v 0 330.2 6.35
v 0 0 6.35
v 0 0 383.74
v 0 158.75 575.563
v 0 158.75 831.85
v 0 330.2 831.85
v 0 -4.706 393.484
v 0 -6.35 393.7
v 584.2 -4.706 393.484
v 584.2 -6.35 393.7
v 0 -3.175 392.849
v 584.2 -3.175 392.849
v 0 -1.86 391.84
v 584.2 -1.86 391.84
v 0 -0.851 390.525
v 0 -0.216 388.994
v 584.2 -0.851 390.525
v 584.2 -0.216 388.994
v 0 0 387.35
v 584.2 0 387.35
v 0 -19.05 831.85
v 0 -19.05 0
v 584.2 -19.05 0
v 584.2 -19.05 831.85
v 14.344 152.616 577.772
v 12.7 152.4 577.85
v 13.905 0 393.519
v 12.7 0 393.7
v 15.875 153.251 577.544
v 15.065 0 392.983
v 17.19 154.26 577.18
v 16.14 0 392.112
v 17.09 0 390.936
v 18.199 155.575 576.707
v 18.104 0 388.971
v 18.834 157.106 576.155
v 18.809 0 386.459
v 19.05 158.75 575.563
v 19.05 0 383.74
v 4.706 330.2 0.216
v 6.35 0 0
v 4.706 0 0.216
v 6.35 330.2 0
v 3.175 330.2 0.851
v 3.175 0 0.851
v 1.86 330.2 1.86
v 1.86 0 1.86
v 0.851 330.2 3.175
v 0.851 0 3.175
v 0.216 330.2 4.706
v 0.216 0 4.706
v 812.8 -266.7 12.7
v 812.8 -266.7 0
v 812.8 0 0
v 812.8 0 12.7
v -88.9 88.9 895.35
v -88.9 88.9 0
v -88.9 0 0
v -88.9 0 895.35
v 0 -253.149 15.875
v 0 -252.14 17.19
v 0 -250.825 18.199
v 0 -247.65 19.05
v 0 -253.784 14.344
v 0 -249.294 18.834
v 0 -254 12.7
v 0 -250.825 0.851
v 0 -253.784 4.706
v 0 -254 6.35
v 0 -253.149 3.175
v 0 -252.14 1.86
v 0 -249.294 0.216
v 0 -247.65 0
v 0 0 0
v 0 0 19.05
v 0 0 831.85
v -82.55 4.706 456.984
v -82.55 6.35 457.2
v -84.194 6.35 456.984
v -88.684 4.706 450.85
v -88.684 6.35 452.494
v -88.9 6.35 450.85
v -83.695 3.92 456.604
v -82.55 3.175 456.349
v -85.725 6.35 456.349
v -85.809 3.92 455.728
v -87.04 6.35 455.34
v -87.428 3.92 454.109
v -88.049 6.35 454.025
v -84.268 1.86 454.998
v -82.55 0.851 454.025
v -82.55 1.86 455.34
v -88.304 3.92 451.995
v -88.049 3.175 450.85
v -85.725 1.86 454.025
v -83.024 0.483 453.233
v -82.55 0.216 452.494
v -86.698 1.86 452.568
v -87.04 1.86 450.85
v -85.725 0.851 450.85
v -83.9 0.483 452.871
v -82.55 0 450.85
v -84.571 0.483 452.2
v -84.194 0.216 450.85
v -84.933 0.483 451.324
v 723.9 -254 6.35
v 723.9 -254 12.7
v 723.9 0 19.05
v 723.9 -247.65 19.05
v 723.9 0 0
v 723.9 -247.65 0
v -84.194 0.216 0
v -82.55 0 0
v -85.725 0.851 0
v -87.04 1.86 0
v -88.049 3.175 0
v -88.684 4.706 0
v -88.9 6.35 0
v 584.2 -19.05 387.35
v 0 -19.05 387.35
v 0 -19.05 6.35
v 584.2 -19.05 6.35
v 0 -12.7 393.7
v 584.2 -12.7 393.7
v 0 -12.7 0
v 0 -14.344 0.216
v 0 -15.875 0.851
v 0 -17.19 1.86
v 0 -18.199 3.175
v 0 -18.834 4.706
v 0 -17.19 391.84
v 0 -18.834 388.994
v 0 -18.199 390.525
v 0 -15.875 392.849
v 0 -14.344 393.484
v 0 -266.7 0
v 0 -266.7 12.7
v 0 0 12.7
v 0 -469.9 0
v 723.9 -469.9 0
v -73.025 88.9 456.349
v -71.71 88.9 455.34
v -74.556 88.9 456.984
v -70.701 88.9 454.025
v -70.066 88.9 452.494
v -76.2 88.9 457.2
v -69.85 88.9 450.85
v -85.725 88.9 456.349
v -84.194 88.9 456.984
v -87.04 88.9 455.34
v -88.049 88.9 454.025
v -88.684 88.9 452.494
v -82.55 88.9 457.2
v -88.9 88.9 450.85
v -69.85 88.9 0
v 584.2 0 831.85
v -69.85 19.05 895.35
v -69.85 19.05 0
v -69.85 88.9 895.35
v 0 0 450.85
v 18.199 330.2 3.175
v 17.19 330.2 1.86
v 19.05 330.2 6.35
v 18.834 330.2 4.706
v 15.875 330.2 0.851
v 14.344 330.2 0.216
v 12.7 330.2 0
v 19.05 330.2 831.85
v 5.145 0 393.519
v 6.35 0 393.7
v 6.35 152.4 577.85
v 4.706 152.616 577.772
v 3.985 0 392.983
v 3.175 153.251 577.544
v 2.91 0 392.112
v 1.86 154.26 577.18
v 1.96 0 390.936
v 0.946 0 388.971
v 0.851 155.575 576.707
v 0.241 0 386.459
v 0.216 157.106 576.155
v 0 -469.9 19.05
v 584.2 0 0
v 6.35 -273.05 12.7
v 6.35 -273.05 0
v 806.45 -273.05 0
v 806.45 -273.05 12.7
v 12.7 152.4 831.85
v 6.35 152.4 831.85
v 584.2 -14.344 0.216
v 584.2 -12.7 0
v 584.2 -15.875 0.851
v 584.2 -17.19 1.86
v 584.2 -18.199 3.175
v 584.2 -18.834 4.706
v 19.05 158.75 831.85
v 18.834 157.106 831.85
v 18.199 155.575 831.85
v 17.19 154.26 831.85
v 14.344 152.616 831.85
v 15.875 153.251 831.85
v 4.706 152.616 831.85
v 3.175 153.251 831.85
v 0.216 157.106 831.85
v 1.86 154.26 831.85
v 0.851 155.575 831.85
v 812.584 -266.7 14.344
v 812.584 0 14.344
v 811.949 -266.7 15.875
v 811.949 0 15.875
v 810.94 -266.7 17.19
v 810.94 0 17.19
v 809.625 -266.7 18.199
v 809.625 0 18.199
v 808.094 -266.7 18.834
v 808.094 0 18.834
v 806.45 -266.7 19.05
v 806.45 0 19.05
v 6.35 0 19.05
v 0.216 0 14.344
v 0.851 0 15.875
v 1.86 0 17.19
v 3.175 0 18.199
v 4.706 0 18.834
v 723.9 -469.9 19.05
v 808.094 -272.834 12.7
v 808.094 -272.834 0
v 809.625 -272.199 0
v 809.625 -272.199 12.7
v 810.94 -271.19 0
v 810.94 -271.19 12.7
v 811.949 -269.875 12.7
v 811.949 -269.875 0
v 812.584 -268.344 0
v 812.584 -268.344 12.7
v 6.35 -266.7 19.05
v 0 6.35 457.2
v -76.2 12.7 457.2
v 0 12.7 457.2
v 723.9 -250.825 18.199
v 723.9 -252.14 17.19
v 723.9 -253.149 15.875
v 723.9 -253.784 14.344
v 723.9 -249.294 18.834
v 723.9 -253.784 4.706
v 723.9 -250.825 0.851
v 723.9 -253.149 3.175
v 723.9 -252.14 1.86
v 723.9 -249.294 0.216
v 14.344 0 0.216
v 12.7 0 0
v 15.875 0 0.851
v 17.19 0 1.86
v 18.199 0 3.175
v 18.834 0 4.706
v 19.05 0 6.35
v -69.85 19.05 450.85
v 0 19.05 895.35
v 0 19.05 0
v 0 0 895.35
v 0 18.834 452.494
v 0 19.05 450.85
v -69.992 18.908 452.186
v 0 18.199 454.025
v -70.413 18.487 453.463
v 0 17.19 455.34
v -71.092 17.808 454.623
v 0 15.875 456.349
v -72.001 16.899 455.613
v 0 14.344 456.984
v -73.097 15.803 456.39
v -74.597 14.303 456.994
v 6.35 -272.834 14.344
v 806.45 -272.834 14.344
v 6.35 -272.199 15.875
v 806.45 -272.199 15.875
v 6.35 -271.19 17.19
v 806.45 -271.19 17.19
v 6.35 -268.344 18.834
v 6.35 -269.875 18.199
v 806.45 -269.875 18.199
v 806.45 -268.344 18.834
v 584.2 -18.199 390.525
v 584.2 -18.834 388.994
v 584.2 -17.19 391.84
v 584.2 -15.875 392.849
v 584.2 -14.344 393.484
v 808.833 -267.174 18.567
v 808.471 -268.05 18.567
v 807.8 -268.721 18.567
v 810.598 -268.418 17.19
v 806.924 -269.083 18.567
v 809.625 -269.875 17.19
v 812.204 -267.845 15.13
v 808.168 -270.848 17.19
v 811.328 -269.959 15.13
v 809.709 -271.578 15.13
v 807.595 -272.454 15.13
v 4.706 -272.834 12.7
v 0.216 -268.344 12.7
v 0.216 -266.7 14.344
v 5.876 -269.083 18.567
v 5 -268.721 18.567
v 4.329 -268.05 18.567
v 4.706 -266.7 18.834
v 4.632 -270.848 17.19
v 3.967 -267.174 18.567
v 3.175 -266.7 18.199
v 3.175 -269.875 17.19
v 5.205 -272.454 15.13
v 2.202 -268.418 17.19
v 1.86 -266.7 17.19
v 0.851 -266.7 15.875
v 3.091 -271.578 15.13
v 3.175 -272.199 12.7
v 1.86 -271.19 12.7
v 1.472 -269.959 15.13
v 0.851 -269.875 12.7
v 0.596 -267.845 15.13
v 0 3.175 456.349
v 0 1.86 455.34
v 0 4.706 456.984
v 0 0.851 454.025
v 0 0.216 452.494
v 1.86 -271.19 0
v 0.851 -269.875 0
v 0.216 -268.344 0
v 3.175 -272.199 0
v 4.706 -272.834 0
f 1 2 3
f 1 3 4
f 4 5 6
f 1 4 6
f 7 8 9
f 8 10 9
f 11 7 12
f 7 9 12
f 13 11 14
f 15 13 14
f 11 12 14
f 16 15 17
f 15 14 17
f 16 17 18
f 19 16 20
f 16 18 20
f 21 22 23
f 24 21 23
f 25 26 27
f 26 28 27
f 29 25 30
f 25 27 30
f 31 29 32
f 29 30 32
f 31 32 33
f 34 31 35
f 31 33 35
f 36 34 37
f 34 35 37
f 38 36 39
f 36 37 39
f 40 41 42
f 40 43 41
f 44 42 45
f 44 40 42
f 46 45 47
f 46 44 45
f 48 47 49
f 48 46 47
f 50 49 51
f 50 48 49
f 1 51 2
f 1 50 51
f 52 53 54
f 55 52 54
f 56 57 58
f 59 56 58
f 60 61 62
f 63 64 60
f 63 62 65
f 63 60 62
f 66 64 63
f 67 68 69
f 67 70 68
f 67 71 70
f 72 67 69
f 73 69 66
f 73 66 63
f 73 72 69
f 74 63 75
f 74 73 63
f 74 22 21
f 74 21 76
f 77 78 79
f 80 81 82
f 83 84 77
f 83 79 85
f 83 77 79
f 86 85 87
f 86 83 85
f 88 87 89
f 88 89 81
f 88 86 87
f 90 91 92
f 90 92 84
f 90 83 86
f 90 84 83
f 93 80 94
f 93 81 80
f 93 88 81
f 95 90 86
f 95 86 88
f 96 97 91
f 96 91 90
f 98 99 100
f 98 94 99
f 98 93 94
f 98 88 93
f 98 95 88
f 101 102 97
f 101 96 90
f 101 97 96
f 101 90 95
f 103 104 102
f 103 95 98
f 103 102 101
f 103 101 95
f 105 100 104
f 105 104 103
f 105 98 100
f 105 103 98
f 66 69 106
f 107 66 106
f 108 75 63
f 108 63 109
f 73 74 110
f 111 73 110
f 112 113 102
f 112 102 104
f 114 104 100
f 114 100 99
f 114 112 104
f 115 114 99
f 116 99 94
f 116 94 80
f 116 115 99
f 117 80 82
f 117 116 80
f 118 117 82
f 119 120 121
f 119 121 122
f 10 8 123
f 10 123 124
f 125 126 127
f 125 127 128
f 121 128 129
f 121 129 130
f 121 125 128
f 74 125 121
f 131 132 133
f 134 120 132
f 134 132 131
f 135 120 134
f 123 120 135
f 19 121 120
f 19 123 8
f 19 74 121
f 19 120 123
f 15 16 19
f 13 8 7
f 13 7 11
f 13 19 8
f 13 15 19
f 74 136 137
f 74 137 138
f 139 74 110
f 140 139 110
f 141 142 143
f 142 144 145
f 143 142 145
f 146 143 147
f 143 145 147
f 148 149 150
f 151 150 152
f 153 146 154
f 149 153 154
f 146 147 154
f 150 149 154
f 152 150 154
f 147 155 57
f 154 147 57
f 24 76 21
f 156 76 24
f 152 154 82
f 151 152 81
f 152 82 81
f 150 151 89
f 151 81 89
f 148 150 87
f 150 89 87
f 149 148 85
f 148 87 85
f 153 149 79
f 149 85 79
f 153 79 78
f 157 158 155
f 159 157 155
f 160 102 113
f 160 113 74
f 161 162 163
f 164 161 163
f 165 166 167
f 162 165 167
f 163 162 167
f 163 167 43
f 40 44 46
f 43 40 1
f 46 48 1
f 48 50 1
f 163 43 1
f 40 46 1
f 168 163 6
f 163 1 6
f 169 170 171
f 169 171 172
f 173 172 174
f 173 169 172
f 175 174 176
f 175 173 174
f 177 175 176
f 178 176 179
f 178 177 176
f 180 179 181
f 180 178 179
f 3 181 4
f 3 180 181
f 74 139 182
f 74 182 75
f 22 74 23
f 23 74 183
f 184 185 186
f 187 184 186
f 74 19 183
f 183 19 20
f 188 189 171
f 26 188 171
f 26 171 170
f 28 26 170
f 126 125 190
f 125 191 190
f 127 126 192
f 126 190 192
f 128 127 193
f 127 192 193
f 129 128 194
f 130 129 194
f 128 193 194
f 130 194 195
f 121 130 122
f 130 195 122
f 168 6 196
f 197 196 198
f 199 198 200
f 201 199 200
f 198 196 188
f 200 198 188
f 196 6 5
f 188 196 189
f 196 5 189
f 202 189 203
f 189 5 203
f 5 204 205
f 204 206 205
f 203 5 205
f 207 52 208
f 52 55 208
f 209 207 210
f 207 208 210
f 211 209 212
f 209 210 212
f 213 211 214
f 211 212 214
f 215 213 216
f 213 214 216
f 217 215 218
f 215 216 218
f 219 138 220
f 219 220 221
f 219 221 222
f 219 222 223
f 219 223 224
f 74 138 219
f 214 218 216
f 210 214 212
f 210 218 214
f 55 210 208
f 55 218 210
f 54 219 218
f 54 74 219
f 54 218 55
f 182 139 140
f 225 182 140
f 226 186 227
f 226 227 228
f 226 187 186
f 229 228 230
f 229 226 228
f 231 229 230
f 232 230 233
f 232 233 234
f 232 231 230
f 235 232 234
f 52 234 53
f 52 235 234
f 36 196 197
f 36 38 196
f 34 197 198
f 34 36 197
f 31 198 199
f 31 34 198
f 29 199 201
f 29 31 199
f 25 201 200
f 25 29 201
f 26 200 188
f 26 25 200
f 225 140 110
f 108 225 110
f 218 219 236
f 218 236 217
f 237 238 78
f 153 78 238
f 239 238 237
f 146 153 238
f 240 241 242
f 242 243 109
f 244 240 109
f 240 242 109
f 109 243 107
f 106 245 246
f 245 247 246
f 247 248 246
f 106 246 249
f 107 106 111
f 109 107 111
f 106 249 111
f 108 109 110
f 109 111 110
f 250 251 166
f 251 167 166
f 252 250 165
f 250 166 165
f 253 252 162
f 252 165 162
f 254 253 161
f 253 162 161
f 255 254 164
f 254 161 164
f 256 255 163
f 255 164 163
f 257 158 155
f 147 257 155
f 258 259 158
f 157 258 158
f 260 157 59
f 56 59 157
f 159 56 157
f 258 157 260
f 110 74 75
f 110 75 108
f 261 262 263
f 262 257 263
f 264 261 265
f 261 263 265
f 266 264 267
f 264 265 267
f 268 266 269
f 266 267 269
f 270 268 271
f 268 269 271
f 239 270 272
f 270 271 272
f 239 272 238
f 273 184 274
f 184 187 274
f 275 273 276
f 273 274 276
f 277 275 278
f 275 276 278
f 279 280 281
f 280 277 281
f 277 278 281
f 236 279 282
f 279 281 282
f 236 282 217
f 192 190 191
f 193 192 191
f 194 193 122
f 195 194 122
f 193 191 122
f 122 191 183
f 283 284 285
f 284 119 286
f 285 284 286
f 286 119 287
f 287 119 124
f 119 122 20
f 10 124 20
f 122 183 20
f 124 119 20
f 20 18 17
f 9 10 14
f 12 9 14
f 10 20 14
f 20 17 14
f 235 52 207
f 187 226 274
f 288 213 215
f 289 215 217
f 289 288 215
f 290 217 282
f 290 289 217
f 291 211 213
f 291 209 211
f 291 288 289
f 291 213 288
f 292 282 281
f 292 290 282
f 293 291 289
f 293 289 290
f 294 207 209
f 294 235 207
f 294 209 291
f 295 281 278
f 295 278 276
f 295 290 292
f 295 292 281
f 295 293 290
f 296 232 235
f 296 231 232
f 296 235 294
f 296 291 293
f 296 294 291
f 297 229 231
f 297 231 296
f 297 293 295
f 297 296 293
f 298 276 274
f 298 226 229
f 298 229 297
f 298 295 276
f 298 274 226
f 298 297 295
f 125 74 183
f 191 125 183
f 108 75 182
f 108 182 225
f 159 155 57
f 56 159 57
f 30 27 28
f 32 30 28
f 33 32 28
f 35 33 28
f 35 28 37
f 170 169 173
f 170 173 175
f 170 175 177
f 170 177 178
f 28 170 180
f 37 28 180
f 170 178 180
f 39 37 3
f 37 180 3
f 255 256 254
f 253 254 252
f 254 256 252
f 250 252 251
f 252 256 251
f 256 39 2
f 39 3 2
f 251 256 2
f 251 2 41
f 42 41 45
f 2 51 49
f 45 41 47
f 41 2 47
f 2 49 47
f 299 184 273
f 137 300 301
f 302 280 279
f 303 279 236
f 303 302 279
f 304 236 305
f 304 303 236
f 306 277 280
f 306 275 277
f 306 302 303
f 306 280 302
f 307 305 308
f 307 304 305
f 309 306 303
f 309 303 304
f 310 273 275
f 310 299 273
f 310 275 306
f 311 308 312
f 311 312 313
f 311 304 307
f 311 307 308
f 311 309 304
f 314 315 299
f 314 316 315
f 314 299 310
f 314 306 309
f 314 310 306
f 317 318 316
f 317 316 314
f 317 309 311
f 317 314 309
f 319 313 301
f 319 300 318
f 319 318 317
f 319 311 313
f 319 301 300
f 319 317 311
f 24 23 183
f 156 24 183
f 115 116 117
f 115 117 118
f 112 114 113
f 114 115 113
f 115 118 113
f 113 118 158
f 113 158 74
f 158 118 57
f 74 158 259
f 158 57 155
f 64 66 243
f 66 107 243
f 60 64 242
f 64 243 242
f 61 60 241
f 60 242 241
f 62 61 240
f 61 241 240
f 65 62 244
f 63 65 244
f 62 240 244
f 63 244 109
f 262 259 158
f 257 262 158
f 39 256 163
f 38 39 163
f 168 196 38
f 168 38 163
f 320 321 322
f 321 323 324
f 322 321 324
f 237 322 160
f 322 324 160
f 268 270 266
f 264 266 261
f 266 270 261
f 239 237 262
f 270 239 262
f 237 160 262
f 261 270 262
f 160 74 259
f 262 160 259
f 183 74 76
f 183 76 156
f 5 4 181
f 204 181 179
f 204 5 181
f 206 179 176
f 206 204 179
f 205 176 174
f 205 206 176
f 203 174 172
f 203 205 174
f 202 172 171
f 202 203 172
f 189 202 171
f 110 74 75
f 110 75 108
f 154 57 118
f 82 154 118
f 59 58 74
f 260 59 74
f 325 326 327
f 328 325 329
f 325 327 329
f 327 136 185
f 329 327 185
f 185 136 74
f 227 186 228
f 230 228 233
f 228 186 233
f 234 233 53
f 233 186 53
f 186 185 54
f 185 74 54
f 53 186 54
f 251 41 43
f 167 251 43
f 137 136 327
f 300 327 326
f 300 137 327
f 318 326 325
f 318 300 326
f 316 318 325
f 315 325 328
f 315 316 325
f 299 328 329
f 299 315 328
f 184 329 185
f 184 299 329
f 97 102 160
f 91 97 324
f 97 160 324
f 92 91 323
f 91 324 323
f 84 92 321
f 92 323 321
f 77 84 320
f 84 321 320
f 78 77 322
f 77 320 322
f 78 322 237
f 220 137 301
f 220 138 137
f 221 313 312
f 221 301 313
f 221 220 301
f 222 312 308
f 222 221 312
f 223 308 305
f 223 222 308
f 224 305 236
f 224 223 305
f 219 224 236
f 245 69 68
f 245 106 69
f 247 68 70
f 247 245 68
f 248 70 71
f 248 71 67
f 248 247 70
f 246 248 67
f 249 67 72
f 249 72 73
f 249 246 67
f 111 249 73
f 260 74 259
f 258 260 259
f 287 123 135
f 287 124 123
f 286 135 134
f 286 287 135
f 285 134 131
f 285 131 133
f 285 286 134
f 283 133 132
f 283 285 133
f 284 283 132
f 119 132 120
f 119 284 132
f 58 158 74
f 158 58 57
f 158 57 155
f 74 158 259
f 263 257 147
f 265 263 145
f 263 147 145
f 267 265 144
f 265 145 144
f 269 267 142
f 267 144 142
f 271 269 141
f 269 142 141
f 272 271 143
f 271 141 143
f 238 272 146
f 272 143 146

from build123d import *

# Parameters (mm, degrees)
F0_W         = 584.2
F0_H         = 19.05
F1_DEPTH     = 831.85
F2_W         = 723.9
F2_H         = 469.9
F3_DEPTH     = 19.05
F4_W         = 723.9
F4_H         = 254
F5_DEPTH     = 19.05
F6_W         = 812.8
F6_H         = 273.05
F7_DEPTH     = 19.05
F9_DEPTH     = 457.2
F11_DEPTH    = 895.35
F14_DEPTH    = 19.05
F15_DEPTH    = 19.05
F16_W        = 584.2
F16_H        = 393.7
F17_DEPTH    = 19.05
F18_R        = 6.35
F19_R        = 6.35
F20_R        = 6.35
F21_R        = 6.35
F22_R        = 6.35
F23_R        = 6.35
F24_R        = 6.35
F25_T1_DEPTH = 466.725
F25_S5_W     = 6.35
F25_S5_H     = 6.35
F25_T6_DEPTH = 6.35


# Not quite as in the source:
# - a fillet or chamfer that OpenCascade refuses, or shapes differently, is made with other operations: its cross-section is extruded or revolved along the edge and cut away or added


with BuildPart() as f1:
    # F0 (on Top) → F1 (new body)
    with BuildSketch(Plane.XY):
        with Locations((292.1, -9.525)):
            Rectangle(F0_W, F0_H)
    extrude(amount=F1_DEPTH)


with BuildPart() as f3:
    # F2 (on Top) → F3 (new body)
    with BuildSketch(Plane.XY):
        with Locations((361.95, -234.95)):
            Rectangle(F2_W, F2_H)
    extrude(amount=F3_DEPTH)


with BuildPart() as f5:
    # F4 (on Top) → F5 (new body)
    with BuildSketch(Plane.XY):
        with Locations((361.95, -127)):
            Rectangle(F4_W, F4_H)
    extrude(amount=F5_DEPTH)

    # F22
    f22_edges = [f5.edges().sort_by_distance(p)[0] for p in [
        (361.95, -254, 19.05),
        (361.95, -254, 0),
    ]]
    fillet(f22_edges, radius=F22_R)


with BuildPart() as f7:
    # F6 (on Top) → F7 (new body)
    with BuildSketch(Plane.XY):
        with Locations((406.4, -136.525)):
            Rectangle(F6_W, F6_H)
    extrude(amount=F7_DEPTH)

    # F18
    f18_edges = [f7.edges().sort_by_distance(p)[0] for p in [
        (0, -273.05, 9.525),
        (812.8, -273.05, 9.525),
        (812.8, -136.525, 19.05),
        (406.4, -273.05, 19.05),
        (0, -136.525, 19.05),
    ]]
    fillet(f18_edges, radius=F18_R)


with BuildPart() as f9:
    # F8 (on Top) → F9 (new body)
    with BuildSketch(Plane.XY):
        Polygon((-88.9, 0), (0, 0), (0, 19.05), (-69.85, 19.05), (-69.85, 88.9), (-88.9, 88.9), align=None)
    extrude(amount=F9_DEPTH)

    # F20
    f20_edges = [f9.edges().sort_by_distance(p)[0] for p in [
        (-44.45, 0, 457.2),
        (-88.9, 44.45, 457.2),
        (-69.85, 53.975, 457.2),
        (-34.925, 19.05, 457.2),
    ]]
    fillet(f20_edges, radius=F20_R)

    # F25: fillet of radius 6.35 on 2 edges, made by hand

    # F25_s2 → F25_t1 (cut)
    with BuildSketch(Plane.XY.offset(-15.875)):
        with BuildLine():
            ThreePointArc((-82.55, 0), (-87.0401280605, 1.8598719395), (-88.9, 6.35))
            Line((-88.9, 6.35), (-88.9, 0))
            Line((-88.9, 0), (-82.55, 0))
        make_face()
    extrude(amount=F25_T1_DEPTH, mode=Mode.SUBTRACT)


with BuildPart() as f11:
    # F10 (on Top) → F11 (new body)
    with BuildSketch(Plane.XY):
        Polygon((-88.9, 0), (0, 0), (0, 19.05), (-69.85, 19.05), (-69.85, 88.9), (-88.9, 88.9), (-88.9, 19.05), align=None)
    extrude(amount=F11_DEPTH)


with BuildPart() as f14:
    # F12 (on Right) → F14 (new body)
    with BuildSketch(Plane.YZ):
        Polygon((551.983873911, 795.822240965), (177.333873911, 421.172240965), (177.333873911, 295.44865527), (551.983873911, 670.09865527), align=None)
    extrude(amount=F14_DEPTH)


with BuildPart() as f15:
    # F13 (on Right) → F15 (new body)
    with BuildSketch(Plane.YZ):
        Polygon((0, 393.7), (0, 0), (330.2, 0), (330.2, 831.85), (152.4, 831.85), (152.4, 577.85), align=None)
    extrude(amount=F15_DEPTH)

    # F21
    f21_edges = [f15.edges().sort_by_distance(p)[0] for p in [
        (19.05, 76.2, 485.775),
        (0, 76.2, 485.775),
    ]]
    fillet(f21_edges, radius=F21_R)

    # F23
    f23_edges = [f15.edges().sort_by_distance(p)[0] for p in [
        (19.05, 165.1, 0),
        (0, 165.1, 0),
    ]]
    fillet(f23_edges, radius=F23_R)

    # F24
    f24_edges = [f15.edges().sort_by_distance(p)[0] for p in [
        (19.05, 152.4, 704.85),
        (0, 152.4, 704.85),
    ]]
    fillet(f24_edges, radius=F24_R)


with BuildPart() as f17:
    # F16 (on Front) → F17 (new body)
    with BuildSketch(Plane.XZ):
        with Locations((292.1, 196.85)):
            Rectangle(F16_W, F16_H)
    extrude(amount=F17_DEPTH)

    # F19
    f19_edges = [f17.edges().sort_by_distance(p)[0] for p in [
        (292.1, -19.05, 393.7),
        (292.1, 0, 393.7),
        (292.1, -19.05, 0),
    ]]
    fillet(f19_edges, radius=F19_R)


with BuildPart() as f25_tool4:
    # F25_s5 → F25_t6 (new body)
    with BuildSketch(Plane.XZ.offset(-6.35)):
        with Locations((-85.725, 454.025)):
            Rectangle(F25_S5_W, F25_S5_H)
    extrude(amount=F25_T6_DEPTH)

    # F25_s7 → F25_t8 (revolve, cut)
    with BuildSketch(Plane(origin=(-82.55, 6.35, 450.85), x_dir=(0.7071067812, 0, -0.7071067812), z_dir=(-0.7071067812, 0, -0.7071067812))):
        with BuildLine():
            ThreePointArc((0, -6.35), (6.35, 0), (0, 6.35))
            Line((0, 6.35), (0, -6.35))
        make_face()
    revolve(axis=Axis((-82.55, 6.35, 450.85), (0, -1, 0)), mode=Mode.SUBTRACT)


with BuildPart() as f9_1:
    add(f9.part)

    # F25_t3: cut F25_tool4
    add(f25_tool4.part, mode=Mode.SUBTRACT)


solid = Compound([f1.part, f3.part, f5.part, f7.part, f11.part, f15.part, f17.part, f9_1.part])
